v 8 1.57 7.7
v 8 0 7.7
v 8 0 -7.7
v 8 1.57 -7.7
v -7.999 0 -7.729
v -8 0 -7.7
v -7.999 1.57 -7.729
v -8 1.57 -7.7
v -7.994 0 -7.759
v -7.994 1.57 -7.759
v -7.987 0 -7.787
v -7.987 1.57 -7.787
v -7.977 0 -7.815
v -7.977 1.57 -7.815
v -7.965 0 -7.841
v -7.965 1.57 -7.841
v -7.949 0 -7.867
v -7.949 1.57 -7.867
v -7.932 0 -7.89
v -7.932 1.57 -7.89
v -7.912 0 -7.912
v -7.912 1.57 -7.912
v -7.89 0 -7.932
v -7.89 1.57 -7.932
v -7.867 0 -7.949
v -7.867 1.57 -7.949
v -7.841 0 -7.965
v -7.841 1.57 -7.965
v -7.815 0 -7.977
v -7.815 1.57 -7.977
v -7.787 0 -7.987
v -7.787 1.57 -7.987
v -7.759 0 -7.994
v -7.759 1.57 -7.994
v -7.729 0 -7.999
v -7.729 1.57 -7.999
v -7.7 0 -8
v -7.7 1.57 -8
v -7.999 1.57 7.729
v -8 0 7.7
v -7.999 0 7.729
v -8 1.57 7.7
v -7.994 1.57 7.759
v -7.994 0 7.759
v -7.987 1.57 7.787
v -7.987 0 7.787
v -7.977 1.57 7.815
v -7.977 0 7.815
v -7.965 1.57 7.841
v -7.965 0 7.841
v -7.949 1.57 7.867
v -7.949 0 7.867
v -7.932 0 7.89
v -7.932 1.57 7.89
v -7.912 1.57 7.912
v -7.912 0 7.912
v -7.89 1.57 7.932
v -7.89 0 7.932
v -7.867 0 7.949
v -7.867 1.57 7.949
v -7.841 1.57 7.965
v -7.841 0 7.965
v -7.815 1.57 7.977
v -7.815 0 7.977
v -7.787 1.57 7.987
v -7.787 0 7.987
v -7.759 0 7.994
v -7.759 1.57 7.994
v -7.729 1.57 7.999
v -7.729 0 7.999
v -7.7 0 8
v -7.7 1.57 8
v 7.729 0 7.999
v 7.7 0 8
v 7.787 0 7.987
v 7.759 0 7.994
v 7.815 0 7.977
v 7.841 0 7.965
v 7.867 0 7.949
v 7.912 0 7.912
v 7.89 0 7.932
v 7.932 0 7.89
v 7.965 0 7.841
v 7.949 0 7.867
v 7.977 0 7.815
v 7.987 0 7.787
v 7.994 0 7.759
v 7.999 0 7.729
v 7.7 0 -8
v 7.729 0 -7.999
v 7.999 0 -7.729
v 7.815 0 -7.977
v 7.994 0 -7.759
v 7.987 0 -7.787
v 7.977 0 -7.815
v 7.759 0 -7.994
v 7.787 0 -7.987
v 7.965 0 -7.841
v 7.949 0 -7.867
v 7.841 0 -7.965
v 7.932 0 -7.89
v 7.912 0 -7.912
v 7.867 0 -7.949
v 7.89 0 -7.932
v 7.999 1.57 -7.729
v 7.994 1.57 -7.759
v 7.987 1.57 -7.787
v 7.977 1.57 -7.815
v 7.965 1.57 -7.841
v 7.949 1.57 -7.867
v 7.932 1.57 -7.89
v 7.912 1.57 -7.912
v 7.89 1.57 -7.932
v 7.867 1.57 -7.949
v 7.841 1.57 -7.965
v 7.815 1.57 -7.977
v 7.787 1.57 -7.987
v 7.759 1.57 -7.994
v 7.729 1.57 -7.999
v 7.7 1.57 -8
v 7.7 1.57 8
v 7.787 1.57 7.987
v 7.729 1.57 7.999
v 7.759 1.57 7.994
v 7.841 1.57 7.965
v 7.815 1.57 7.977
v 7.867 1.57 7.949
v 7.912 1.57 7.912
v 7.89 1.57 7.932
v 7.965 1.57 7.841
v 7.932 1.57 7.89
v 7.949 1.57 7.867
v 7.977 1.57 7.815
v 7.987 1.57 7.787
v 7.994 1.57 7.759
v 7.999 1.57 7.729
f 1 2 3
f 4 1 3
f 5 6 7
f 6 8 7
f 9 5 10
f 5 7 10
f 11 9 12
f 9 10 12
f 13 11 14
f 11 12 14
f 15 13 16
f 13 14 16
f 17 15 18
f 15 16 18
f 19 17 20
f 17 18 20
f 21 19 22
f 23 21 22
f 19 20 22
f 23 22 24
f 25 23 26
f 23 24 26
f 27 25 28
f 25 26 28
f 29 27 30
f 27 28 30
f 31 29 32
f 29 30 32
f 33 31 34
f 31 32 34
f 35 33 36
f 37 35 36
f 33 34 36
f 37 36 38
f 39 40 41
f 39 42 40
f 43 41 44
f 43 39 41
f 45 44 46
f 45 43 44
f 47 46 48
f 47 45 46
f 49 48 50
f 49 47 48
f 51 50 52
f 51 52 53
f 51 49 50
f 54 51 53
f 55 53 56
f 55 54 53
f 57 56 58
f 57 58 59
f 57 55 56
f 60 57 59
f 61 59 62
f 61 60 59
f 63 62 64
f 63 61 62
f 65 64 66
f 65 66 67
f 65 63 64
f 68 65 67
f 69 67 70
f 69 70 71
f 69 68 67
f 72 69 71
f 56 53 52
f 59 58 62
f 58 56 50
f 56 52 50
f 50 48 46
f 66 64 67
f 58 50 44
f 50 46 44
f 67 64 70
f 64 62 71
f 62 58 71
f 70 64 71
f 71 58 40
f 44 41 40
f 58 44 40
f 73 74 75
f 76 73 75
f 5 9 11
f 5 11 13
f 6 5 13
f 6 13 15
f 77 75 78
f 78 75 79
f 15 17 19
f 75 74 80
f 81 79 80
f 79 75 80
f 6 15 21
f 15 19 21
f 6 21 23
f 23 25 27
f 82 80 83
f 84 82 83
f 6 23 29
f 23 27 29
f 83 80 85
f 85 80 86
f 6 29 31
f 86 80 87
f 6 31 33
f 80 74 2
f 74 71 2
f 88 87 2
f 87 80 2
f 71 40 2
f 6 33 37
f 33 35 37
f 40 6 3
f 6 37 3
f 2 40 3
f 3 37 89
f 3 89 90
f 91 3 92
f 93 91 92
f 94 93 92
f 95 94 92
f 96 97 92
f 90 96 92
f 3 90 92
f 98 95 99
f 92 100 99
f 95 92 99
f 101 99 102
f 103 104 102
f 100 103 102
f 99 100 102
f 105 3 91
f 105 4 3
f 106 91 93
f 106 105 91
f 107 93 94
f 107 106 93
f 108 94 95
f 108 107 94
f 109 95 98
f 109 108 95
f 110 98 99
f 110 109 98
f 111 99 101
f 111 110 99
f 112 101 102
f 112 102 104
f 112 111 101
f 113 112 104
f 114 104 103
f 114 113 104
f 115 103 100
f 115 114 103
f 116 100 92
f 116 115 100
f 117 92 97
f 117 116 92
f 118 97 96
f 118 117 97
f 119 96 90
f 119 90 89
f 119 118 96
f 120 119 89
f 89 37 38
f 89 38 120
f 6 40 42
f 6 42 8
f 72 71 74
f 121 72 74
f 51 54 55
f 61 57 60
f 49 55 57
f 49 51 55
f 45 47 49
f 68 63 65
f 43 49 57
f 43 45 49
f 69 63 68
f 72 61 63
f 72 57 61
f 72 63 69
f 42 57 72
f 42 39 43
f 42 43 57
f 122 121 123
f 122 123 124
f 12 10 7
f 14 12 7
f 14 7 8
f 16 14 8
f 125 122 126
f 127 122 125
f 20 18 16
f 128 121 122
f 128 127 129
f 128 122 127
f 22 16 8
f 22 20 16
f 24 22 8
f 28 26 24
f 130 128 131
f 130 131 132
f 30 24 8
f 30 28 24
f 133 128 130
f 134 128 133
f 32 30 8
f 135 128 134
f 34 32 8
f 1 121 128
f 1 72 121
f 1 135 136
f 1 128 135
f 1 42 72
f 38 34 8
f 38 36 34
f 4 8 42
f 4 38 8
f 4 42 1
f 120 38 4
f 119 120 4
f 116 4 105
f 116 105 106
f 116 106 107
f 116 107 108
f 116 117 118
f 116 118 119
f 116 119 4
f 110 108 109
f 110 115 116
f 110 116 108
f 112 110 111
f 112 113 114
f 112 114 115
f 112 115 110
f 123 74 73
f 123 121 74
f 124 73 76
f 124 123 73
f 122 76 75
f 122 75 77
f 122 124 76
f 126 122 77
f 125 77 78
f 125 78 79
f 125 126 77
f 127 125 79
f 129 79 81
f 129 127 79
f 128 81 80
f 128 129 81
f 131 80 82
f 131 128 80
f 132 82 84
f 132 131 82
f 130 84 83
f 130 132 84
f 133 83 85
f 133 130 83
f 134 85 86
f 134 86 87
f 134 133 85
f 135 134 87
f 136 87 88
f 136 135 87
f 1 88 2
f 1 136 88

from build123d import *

# Parameters (mm, degrees)
SKETCH1_W           = 16
SKETCH1_H           = 16
BOSS_EXTRUDE1_DEPTH = 1.57
FILLET1_R           = 0.3


with BuildPart() as part:
    # Sketch1 → Boss-Extrude1 (new body)
    with BuildSketch(Plane(origin=(0, 0, 0), x_dir=(1, 0, 0), z_dir=(0, 1, 0))):
        Rectangle(SKETCH1_W, SKETCH1_H)
    extrude(amount=BOSS_EXTRUDE1_DEPTH)

    # Fillet1
    fillet1_edges = [part.edges().sort_by_distance(p)[0] for p in [
        (8, 0.785, 8),
        (-8, 0.785, 8),
        (-8, 0.785, -8),
        (8, 0.785, -8),
    ]]
    fillet(fillet1_edges, radius=FILLET1_R)


solid = part.part
